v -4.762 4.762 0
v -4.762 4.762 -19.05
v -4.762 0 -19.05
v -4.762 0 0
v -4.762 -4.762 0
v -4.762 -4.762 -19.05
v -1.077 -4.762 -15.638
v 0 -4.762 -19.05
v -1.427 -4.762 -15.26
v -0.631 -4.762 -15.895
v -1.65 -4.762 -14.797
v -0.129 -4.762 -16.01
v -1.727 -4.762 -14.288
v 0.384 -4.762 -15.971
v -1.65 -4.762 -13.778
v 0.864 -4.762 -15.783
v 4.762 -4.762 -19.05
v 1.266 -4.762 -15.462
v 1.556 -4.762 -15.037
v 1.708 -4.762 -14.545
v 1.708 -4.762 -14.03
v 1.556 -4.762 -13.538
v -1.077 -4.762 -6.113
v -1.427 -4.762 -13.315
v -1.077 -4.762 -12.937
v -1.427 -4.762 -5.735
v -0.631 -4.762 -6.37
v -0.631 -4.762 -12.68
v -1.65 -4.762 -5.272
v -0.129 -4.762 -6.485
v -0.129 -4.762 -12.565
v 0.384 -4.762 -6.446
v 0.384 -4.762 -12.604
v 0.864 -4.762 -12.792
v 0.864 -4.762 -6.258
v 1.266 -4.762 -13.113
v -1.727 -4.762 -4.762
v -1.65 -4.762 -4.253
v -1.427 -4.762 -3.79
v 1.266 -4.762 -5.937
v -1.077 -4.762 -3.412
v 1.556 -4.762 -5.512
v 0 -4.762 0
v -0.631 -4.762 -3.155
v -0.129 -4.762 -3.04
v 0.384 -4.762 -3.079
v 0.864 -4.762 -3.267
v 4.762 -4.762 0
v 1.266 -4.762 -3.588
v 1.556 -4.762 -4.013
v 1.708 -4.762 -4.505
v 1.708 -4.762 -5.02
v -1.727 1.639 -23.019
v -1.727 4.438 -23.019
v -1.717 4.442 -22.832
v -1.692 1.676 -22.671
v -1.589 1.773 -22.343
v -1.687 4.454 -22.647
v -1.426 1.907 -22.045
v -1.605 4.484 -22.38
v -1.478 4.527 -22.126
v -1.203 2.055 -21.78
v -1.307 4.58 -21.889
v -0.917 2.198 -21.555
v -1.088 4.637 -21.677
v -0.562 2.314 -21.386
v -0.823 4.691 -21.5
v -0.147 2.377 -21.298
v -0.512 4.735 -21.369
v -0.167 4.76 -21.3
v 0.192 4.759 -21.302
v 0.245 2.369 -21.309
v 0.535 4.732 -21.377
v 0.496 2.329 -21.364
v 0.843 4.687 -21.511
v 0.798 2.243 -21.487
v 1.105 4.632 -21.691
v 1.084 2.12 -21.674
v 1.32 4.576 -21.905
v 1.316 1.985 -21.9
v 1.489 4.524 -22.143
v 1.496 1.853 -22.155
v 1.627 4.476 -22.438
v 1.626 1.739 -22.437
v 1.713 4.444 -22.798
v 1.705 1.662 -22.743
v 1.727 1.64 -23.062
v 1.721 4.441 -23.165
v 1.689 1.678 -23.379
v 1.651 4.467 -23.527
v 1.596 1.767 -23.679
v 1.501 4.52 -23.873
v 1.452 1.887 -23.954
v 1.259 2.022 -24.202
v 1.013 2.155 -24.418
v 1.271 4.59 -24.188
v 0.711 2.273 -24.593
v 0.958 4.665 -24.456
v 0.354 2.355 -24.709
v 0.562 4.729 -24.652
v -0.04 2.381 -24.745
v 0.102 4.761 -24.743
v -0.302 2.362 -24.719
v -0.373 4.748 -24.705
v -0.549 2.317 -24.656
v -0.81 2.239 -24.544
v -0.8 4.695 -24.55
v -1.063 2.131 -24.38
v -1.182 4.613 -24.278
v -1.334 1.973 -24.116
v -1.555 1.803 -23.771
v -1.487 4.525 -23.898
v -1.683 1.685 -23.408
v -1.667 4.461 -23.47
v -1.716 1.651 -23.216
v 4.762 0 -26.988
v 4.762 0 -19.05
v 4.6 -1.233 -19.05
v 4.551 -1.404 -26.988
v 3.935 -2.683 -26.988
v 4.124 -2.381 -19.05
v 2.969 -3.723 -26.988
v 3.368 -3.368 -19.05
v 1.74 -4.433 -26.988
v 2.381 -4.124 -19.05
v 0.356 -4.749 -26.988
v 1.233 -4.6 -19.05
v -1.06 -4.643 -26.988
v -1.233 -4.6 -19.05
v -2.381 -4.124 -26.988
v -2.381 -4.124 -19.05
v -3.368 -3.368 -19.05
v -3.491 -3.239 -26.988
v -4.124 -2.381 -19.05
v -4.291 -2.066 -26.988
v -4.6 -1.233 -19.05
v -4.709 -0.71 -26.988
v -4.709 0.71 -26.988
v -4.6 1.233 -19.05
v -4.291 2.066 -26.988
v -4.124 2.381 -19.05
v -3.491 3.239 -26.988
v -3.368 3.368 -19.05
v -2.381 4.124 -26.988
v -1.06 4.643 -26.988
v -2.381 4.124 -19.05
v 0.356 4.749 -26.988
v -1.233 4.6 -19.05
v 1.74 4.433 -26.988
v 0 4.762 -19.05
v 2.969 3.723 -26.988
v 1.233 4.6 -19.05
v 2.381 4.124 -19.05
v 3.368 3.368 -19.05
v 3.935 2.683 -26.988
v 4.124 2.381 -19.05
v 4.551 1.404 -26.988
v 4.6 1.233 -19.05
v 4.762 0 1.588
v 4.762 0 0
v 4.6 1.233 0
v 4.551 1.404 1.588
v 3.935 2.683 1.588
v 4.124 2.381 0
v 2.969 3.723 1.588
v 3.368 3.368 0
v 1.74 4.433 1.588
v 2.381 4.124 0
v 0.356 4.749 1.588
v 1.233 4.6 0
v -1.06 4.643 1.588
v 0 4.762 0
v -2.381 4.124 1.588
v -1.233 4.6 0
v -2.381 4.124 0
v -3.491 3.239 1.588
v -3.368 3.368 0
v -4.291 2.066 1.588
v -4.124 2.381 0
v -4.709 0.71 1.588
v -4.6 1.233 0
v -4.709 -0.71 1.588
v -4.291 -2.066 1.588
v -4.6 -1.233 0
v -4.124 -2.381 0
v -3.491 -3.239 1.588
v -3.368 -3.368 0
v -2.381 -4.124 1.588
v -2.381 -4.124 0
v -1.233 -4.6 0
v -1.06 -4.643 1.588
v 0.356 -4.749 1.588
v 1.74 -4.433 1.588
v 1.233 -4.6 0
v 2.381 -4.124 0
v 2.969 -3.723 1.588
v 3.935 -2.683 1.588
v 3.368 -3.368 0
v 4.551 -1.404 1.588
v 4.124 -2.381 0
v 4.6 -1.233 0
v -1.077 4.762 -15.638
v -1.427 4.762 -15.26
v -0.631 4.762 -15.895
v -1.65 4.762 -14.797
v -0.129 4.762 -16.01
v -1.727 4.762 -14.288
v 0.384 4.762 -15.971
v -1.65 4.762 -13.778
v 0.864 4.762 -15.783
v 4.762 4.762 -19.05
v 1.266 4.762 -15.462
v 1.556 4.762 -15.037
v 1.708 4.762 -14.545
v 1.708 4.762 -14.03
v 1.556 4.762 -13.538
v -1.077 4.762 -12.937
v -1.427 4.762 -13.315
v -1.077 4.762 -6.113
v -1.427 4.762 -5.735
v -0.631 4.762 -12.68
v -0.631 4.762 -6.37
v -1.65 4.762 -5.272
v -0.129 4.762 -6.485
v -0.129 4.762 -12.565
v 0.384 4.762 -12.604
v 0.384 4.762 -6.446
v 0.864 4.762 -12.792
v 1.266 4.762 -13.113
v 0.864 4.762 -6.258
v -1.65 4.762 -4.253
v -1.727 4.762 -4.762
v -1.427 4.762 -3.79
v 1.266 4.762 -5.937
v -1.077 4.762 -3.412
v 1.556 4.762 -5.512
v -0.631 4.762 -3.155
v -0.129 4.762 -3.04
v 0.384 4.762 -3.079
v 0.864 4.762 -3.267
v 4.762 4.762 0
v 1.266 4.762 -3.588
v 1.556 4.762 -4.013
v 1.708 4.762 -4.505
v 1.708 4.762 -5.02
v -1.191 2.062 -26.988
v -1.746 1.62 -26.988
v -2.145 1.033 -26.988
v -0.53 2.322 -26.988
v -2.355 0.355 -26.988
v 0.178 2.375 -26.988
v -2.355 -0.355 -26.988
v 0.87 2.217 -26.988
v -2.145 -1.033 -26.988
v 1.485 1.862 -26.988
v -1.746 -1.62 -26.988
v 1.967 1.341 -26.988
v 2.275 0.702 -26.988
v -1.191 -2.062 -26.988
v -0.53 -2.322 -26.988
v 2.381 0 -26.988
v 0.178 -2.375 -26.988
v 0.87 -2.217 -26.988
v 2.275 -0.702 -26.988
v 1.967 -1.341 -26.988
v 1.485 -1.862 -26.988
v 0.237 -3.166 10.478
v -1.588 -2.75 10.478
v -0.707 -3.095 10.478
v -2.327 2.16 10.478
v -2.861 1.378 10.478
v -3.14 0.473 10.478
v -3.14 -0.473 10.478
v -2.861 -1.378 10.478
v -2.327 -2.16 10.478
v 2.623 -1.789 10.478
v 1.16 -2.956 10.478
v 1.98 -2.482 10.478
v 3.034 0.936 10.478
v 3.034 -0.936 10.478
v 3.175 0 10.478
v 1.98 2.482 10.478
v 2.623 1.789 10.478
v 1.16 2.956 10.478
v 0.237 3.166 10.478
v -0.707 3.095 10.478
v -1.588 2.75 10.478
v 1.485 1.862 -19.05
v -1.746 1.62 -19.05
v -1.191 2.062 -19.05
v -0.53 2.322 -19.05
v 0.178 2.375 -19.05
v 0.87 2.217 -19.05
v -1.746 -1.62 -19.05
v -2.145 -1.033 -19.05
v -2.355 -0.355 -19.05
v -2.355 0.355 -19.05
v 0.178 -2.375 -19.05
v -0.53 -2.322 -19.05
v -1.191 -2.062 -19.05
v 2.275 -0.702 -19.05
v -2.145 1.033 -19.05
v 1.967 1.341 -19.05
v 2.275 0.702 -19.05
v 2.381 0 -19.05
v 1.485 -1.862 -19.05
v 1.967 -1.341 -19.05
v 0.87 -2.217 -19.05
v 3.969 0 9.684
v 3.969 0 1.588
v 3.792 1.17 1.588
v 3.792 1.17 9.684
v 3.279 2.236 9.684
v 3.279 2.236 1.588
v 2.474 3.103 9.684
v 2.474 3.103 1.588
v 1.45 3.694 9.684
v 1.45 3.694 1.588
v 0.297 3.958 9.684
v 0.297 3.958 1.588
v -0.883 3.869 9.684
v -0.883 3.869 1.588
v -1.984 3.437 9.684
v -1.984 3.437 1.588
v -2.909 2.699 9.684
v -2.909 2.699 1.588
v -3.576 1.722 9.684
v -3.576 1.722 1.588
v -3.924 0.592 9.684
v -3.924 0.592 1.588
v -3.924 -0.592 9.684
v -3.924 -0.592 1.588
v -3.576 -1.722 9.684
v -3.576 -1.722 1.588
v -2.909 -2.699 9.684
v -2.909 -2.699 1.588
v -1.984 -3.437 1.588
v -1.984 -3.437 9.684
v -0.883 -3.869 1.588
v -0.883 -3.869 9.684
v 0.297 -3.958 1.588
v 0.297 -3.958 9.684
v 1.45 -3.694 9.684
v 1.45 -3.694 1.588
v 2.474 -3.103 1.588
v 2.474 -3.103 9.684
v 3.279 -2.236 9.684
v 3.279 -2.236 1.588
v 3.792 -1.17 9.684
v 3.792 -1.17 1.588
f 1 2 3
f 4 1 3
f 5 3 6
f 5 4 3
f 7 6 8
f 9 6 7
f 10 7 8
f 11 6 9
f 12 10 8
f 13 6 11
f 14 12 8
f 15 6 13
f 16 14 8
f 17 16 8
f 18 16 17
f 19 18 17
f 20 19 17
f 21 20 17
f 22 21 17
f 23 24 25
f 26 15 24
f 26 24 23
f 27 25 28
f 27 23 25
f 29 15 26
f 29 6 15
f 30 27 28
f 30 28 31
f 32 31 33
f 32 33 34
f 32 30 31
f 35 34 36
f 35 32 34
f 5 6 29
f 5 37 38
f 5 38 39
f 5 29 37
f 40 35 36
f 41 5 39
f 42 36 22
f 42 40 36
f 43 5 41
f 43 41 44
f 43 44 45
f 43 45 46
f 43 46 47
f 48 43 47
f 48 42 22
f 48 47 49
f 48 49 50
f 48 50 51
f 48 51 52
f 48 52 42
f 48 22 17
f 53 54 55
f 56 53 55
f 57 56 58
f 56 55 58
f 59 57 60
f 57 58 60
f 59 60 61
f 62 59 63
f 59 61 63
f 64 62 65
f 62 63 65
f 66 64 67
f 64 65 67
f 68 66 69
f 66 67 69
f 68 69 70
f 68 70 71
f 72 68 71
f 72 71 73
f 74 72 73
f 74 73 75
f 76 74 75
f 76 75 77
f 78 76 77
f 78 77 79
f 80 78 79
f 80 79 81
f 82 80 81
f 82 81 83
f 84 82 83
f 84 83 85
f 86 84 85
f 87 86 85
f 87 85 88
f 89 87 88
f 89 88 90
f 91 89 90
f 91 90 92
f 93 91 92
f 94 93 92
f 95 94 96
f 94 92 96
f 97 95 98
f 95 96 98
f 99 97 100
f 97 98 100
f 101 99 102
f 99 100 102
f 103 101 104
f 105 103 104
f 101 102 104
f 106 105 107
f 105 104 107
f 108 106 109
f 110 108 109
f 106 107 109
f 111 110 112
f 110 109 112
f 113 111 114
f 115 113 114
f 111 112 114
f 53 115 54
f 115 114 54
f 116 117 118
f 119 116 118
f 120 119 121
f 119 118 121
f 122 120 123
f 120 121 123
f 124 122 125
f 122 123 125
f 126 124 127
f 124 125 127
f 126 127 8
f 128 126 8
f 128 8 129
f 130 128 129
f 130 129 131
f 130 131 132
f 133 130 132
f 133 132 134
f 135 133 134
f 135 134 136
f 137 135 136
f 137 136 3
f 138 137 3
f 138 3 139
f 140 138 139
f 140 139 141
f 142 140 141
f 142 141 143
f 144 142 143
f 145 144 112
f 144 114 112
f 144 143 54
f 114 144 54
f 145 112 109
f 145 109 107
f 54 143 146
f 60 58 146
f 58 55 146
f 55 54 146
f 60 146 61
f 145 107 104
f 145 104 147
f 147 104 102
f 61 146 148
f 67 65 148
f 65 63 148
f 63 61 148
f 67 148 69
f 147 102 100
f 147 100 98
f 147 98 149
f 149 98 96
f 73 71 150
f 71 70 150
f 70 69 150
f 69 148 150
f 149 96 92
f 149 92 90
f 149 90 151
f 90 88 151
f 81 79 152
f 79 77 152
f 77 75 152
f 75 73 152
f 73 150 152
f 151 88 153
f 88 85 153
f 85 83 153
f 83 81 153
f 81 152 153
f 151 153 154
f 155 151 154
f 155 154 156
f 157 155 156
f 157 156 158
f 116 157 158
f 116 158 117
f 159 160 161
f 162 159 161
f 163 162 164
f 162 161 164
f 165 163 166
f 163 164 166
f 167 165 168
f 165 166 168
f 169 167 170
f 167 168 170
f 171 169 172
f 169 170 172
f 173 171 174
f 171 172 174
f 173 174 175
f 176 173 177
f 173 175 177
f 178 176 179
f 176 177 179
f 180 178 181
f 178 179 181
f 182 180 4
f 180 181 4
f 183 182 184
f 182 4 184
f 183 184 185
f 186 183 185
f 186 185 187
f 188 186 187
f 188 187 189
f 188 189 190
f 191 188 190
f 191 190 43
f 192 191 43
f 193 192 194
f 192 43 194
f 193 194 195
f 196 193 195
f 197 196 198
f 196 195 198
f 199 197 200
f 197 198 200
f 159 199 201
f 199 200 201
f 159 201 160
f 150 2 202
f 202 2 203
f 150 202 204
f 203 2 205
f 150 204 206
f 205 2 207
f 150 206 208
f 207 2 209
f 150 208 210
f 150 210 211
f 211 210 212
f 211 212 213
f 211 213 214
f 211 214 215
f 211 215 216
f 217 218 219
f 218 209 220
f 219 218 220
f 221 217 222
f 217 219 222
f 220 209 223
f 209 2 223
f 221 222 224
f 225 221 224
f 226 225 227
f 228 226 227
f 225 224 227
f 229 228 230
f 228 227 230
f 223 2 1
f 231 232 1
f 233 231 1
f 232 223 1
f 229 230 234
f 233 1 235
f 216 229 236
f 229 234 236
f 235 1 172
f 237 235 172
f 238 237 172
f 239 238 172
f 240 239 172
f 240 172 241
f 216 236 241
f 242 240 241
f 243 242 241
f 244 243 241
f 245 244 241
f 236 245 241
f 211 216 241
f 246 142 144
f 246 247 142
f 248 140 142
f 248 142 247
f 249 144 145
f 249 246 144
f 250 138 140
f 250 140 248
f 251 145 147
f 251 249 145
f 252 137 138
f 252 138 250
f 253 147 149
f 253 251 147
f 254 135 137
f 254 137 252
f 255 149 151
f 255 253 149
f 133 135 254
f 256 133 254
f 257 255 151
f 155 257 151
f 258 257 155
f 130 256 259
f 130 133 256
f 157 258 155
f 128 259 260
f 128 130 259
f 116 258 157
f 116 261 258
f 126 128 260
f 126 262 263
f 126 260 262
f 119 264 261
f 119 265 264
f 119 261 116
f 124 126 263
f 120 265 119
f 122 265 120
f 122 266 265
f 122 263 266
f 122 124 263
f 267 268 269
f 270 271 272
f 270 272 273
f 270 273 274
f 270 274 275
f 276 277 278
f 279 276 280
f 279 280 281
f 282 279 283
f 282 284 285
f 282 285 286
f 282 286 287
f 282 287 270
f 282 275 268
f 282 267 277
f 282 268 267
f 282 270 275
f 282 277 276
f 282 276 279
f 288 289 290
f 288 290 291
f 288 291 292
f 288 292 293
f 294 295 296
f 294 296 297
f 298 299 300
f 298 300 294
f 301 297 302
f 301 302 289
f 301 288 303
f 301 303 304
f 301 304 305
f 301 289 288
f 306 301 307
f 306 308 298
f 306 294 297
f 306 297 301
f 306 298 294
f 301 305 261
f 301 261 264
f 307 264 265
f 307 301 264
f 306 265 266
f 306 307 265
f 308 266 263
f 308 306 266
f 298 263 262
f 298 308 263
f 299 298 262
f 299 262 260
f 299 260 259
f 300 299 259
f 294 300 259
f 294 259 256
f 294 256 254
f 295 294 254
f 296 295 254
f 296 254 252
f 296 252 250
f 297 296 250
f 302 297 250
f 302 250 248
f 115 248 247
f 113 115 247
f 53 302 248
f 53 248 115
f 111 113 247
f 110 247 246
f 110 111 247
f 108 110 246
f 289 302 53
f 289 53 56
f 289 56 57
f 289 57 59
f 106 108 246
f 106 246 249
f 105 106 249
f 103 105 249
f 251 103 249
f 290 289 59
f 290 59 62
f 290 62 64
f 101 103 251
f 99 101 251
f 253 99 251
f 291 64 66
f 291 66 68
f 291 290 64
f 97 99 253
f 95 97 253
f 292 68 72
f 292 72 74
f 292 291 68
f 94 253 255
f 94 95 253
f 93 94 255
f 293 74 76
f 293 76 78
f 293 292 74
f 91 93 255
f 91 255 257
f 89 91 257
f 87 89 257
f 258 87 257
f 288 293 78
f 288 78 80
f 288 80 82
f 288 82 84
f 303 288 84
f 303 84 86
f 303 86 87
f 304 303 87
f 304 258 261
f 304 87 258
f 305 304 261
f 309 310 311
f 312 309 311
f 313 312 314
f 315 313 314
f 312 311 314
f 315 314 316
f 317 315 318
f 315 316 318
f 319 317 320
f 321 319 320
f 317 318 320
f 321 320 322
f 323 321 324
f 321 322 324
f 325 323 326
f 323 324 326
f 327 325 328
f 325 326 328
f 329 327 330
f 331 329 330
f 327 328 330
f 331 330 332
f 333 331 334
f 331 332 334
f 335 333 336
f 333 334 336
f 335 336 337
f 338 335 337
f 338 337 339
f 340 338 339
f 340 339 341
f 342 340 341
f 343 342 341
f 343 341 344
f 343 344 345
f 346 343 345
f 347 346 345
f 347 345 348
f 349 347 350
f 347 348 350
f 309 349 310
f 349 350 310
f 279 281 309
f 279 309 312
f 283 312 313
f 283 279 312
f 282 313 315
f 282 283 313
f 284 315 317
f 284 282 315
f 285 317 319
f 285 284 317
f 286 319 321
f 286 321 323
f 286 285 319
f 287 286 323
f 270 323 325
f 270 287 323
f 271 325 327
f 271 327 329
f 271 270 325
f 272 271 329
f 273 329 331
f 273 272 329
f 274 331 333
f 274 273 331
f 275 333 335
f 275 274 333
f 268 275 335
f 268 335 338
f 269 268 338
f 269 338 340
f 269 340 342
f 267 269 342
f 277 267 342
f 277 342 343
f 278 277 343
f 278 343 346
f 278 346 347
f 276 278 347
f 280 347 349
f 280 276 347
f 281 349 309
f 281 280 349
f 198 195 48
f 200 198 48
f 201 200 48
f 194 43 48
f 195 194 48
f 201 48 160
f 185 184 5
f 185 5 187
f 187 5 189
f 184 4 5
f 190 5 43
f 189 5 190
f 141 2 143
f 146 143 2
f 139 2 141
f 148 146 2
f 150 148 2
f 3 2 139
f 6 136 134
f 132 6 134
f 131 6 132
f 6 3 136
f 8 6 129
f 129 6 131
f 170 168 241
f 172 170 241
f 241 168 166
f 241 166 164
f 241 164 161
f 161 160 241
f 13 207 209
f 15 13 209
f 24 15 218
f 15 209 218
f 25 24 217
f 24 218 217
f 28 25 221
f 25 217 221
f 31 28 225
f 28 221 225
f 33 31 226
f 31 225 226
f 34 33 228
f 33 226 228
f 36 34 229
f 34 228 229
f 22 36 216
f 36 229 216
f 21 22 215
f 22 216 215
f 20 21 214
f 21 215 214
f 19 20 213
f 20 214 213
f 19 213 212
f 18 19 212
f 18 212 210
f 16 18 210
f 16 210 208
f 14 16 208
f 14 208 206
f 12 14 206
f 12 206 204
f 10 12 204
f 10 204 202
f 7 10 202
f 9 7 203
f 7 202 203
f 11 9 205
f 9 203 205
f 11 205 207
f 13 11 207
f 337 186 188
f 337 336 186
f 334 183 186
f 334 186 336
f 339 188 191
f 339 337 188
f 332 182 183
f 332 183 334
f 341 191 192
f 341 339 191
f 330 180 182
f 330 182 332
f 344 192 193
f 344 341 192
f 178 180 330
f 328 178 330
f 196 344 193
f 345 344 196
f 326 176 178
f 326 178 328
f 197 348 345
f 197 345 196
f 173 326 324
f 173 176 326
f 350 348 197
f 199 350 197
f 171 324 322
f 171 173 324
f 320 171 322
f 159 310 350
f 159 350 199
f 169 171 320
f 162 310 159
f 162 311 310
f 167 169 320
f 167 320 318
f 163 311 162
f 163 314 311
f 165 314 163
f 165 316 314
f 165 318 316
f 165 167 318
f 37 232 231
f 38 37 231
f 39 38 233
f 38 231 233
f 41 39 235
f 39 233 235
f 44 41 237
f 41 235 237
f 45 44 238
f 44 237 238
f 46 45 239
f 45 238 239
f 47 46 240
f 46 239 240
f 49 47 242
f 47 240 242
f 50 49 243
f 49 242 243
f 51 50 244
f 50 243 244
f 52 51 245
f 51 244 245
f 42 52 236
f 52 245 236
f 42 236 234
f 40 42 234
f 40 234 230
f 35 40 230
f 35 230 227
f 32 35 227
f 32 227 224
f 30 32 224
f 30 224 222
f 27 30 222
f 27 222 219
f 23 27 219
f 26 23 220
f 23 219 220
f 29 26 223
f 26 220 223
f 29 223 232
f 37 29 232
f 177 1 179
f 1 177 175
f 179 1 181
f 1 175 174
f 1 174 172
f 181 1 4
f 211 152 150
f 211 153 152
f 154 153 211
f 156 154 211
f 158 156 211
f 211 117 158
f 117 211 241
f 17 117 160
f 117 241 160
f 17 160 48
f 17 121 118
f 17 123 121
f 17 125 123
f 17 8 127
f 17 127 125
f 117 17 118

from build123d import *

# Parameters (mm, degrees)
F0_R      = 4.7625
F1_DEPTH  = 1.5875
F2_R      = 3.96875
F3_DEPTH  = 8.89
F4_W      = 9.525
F4_H      = 9.525
F5_DEPTH  = 19.05
F6_SIZE   = 0.79375
F7_R      = 4.7625
F7_R_2    = 2.38125
F8_DEPTH  = 7.9375
F9_R      = 1.7272
F10_DEPTH = 9.525
F11_R     = 1.7272
F12_DEPTH = 4.1232527964


with BuildPart() as f1:
    # F0 (on Top) → F1 (new body)
    with BuildSketch(Plane.XY):
        Circle(F0_R)
    extrude(amount=F1_DEPTH)

    # F2 (on face) → F3 (join)
    with BuildSketch(Plane.XY.offset(1.5875)):
        Circle(F2_R)
    extrude(amount=F3_DEPTH)

    # F4 (on face) → F5 (join)
    with BuildSketch(Plane(origin=(0, 0, 0), x_dir=(1, 0, 0), z_dir=(0, 0, -1))):
        Rectangle(F4_W, F4_H)
    extrude(amount=F5_DEPTH)

    # F6
    f6_edges = [f1.edges().sort_by_distance(p)[0] for p in [
        (-3.96875, 0, 10.4775),
    ]]
    chamfer(f6_edges, length=F6_SIZE)

    # F7 (on face) → F8 (join)
    with BuildSketch(Plane(origin=(0, 0, -19.05), x_dir=(1, 0, 0), z_dir=(0, 0, -1))):
        Circle(F7_R)
        Circle(F7_R_2, mode=Mode.SUBTRACT)
    extrude(amount=F8_DEPTH)

    # F9 (on face) → F10 (cut, through all)
    with BuildSketch(Plane(origin=(0, 4.7625, 0), x_dir=(-1, 0, 0), z_dir=(0, 1, 0))):
        with Locations((0, -4.7625)):
            Circle(F9_R)
        with Locations((0, -14.2875)):
            Circle(F9_R)
    extrude(amount=-F10_DEPTH, mode=Mode.SUBTRACT)

    # F11 (on face) → F12 (cut, up to face)
    with BuildSketch(Plane(origin=(0, 4.7625, 0), x_dir=(-1, 0, 0), z_dir=(0, 1, 0))):
        with Locations((0, -23.01875)):
            Circle(F11_R)
    extrude(amount=-F12_DEPTH, mode=Mode.SUBTRACT)


solid = f1.part
